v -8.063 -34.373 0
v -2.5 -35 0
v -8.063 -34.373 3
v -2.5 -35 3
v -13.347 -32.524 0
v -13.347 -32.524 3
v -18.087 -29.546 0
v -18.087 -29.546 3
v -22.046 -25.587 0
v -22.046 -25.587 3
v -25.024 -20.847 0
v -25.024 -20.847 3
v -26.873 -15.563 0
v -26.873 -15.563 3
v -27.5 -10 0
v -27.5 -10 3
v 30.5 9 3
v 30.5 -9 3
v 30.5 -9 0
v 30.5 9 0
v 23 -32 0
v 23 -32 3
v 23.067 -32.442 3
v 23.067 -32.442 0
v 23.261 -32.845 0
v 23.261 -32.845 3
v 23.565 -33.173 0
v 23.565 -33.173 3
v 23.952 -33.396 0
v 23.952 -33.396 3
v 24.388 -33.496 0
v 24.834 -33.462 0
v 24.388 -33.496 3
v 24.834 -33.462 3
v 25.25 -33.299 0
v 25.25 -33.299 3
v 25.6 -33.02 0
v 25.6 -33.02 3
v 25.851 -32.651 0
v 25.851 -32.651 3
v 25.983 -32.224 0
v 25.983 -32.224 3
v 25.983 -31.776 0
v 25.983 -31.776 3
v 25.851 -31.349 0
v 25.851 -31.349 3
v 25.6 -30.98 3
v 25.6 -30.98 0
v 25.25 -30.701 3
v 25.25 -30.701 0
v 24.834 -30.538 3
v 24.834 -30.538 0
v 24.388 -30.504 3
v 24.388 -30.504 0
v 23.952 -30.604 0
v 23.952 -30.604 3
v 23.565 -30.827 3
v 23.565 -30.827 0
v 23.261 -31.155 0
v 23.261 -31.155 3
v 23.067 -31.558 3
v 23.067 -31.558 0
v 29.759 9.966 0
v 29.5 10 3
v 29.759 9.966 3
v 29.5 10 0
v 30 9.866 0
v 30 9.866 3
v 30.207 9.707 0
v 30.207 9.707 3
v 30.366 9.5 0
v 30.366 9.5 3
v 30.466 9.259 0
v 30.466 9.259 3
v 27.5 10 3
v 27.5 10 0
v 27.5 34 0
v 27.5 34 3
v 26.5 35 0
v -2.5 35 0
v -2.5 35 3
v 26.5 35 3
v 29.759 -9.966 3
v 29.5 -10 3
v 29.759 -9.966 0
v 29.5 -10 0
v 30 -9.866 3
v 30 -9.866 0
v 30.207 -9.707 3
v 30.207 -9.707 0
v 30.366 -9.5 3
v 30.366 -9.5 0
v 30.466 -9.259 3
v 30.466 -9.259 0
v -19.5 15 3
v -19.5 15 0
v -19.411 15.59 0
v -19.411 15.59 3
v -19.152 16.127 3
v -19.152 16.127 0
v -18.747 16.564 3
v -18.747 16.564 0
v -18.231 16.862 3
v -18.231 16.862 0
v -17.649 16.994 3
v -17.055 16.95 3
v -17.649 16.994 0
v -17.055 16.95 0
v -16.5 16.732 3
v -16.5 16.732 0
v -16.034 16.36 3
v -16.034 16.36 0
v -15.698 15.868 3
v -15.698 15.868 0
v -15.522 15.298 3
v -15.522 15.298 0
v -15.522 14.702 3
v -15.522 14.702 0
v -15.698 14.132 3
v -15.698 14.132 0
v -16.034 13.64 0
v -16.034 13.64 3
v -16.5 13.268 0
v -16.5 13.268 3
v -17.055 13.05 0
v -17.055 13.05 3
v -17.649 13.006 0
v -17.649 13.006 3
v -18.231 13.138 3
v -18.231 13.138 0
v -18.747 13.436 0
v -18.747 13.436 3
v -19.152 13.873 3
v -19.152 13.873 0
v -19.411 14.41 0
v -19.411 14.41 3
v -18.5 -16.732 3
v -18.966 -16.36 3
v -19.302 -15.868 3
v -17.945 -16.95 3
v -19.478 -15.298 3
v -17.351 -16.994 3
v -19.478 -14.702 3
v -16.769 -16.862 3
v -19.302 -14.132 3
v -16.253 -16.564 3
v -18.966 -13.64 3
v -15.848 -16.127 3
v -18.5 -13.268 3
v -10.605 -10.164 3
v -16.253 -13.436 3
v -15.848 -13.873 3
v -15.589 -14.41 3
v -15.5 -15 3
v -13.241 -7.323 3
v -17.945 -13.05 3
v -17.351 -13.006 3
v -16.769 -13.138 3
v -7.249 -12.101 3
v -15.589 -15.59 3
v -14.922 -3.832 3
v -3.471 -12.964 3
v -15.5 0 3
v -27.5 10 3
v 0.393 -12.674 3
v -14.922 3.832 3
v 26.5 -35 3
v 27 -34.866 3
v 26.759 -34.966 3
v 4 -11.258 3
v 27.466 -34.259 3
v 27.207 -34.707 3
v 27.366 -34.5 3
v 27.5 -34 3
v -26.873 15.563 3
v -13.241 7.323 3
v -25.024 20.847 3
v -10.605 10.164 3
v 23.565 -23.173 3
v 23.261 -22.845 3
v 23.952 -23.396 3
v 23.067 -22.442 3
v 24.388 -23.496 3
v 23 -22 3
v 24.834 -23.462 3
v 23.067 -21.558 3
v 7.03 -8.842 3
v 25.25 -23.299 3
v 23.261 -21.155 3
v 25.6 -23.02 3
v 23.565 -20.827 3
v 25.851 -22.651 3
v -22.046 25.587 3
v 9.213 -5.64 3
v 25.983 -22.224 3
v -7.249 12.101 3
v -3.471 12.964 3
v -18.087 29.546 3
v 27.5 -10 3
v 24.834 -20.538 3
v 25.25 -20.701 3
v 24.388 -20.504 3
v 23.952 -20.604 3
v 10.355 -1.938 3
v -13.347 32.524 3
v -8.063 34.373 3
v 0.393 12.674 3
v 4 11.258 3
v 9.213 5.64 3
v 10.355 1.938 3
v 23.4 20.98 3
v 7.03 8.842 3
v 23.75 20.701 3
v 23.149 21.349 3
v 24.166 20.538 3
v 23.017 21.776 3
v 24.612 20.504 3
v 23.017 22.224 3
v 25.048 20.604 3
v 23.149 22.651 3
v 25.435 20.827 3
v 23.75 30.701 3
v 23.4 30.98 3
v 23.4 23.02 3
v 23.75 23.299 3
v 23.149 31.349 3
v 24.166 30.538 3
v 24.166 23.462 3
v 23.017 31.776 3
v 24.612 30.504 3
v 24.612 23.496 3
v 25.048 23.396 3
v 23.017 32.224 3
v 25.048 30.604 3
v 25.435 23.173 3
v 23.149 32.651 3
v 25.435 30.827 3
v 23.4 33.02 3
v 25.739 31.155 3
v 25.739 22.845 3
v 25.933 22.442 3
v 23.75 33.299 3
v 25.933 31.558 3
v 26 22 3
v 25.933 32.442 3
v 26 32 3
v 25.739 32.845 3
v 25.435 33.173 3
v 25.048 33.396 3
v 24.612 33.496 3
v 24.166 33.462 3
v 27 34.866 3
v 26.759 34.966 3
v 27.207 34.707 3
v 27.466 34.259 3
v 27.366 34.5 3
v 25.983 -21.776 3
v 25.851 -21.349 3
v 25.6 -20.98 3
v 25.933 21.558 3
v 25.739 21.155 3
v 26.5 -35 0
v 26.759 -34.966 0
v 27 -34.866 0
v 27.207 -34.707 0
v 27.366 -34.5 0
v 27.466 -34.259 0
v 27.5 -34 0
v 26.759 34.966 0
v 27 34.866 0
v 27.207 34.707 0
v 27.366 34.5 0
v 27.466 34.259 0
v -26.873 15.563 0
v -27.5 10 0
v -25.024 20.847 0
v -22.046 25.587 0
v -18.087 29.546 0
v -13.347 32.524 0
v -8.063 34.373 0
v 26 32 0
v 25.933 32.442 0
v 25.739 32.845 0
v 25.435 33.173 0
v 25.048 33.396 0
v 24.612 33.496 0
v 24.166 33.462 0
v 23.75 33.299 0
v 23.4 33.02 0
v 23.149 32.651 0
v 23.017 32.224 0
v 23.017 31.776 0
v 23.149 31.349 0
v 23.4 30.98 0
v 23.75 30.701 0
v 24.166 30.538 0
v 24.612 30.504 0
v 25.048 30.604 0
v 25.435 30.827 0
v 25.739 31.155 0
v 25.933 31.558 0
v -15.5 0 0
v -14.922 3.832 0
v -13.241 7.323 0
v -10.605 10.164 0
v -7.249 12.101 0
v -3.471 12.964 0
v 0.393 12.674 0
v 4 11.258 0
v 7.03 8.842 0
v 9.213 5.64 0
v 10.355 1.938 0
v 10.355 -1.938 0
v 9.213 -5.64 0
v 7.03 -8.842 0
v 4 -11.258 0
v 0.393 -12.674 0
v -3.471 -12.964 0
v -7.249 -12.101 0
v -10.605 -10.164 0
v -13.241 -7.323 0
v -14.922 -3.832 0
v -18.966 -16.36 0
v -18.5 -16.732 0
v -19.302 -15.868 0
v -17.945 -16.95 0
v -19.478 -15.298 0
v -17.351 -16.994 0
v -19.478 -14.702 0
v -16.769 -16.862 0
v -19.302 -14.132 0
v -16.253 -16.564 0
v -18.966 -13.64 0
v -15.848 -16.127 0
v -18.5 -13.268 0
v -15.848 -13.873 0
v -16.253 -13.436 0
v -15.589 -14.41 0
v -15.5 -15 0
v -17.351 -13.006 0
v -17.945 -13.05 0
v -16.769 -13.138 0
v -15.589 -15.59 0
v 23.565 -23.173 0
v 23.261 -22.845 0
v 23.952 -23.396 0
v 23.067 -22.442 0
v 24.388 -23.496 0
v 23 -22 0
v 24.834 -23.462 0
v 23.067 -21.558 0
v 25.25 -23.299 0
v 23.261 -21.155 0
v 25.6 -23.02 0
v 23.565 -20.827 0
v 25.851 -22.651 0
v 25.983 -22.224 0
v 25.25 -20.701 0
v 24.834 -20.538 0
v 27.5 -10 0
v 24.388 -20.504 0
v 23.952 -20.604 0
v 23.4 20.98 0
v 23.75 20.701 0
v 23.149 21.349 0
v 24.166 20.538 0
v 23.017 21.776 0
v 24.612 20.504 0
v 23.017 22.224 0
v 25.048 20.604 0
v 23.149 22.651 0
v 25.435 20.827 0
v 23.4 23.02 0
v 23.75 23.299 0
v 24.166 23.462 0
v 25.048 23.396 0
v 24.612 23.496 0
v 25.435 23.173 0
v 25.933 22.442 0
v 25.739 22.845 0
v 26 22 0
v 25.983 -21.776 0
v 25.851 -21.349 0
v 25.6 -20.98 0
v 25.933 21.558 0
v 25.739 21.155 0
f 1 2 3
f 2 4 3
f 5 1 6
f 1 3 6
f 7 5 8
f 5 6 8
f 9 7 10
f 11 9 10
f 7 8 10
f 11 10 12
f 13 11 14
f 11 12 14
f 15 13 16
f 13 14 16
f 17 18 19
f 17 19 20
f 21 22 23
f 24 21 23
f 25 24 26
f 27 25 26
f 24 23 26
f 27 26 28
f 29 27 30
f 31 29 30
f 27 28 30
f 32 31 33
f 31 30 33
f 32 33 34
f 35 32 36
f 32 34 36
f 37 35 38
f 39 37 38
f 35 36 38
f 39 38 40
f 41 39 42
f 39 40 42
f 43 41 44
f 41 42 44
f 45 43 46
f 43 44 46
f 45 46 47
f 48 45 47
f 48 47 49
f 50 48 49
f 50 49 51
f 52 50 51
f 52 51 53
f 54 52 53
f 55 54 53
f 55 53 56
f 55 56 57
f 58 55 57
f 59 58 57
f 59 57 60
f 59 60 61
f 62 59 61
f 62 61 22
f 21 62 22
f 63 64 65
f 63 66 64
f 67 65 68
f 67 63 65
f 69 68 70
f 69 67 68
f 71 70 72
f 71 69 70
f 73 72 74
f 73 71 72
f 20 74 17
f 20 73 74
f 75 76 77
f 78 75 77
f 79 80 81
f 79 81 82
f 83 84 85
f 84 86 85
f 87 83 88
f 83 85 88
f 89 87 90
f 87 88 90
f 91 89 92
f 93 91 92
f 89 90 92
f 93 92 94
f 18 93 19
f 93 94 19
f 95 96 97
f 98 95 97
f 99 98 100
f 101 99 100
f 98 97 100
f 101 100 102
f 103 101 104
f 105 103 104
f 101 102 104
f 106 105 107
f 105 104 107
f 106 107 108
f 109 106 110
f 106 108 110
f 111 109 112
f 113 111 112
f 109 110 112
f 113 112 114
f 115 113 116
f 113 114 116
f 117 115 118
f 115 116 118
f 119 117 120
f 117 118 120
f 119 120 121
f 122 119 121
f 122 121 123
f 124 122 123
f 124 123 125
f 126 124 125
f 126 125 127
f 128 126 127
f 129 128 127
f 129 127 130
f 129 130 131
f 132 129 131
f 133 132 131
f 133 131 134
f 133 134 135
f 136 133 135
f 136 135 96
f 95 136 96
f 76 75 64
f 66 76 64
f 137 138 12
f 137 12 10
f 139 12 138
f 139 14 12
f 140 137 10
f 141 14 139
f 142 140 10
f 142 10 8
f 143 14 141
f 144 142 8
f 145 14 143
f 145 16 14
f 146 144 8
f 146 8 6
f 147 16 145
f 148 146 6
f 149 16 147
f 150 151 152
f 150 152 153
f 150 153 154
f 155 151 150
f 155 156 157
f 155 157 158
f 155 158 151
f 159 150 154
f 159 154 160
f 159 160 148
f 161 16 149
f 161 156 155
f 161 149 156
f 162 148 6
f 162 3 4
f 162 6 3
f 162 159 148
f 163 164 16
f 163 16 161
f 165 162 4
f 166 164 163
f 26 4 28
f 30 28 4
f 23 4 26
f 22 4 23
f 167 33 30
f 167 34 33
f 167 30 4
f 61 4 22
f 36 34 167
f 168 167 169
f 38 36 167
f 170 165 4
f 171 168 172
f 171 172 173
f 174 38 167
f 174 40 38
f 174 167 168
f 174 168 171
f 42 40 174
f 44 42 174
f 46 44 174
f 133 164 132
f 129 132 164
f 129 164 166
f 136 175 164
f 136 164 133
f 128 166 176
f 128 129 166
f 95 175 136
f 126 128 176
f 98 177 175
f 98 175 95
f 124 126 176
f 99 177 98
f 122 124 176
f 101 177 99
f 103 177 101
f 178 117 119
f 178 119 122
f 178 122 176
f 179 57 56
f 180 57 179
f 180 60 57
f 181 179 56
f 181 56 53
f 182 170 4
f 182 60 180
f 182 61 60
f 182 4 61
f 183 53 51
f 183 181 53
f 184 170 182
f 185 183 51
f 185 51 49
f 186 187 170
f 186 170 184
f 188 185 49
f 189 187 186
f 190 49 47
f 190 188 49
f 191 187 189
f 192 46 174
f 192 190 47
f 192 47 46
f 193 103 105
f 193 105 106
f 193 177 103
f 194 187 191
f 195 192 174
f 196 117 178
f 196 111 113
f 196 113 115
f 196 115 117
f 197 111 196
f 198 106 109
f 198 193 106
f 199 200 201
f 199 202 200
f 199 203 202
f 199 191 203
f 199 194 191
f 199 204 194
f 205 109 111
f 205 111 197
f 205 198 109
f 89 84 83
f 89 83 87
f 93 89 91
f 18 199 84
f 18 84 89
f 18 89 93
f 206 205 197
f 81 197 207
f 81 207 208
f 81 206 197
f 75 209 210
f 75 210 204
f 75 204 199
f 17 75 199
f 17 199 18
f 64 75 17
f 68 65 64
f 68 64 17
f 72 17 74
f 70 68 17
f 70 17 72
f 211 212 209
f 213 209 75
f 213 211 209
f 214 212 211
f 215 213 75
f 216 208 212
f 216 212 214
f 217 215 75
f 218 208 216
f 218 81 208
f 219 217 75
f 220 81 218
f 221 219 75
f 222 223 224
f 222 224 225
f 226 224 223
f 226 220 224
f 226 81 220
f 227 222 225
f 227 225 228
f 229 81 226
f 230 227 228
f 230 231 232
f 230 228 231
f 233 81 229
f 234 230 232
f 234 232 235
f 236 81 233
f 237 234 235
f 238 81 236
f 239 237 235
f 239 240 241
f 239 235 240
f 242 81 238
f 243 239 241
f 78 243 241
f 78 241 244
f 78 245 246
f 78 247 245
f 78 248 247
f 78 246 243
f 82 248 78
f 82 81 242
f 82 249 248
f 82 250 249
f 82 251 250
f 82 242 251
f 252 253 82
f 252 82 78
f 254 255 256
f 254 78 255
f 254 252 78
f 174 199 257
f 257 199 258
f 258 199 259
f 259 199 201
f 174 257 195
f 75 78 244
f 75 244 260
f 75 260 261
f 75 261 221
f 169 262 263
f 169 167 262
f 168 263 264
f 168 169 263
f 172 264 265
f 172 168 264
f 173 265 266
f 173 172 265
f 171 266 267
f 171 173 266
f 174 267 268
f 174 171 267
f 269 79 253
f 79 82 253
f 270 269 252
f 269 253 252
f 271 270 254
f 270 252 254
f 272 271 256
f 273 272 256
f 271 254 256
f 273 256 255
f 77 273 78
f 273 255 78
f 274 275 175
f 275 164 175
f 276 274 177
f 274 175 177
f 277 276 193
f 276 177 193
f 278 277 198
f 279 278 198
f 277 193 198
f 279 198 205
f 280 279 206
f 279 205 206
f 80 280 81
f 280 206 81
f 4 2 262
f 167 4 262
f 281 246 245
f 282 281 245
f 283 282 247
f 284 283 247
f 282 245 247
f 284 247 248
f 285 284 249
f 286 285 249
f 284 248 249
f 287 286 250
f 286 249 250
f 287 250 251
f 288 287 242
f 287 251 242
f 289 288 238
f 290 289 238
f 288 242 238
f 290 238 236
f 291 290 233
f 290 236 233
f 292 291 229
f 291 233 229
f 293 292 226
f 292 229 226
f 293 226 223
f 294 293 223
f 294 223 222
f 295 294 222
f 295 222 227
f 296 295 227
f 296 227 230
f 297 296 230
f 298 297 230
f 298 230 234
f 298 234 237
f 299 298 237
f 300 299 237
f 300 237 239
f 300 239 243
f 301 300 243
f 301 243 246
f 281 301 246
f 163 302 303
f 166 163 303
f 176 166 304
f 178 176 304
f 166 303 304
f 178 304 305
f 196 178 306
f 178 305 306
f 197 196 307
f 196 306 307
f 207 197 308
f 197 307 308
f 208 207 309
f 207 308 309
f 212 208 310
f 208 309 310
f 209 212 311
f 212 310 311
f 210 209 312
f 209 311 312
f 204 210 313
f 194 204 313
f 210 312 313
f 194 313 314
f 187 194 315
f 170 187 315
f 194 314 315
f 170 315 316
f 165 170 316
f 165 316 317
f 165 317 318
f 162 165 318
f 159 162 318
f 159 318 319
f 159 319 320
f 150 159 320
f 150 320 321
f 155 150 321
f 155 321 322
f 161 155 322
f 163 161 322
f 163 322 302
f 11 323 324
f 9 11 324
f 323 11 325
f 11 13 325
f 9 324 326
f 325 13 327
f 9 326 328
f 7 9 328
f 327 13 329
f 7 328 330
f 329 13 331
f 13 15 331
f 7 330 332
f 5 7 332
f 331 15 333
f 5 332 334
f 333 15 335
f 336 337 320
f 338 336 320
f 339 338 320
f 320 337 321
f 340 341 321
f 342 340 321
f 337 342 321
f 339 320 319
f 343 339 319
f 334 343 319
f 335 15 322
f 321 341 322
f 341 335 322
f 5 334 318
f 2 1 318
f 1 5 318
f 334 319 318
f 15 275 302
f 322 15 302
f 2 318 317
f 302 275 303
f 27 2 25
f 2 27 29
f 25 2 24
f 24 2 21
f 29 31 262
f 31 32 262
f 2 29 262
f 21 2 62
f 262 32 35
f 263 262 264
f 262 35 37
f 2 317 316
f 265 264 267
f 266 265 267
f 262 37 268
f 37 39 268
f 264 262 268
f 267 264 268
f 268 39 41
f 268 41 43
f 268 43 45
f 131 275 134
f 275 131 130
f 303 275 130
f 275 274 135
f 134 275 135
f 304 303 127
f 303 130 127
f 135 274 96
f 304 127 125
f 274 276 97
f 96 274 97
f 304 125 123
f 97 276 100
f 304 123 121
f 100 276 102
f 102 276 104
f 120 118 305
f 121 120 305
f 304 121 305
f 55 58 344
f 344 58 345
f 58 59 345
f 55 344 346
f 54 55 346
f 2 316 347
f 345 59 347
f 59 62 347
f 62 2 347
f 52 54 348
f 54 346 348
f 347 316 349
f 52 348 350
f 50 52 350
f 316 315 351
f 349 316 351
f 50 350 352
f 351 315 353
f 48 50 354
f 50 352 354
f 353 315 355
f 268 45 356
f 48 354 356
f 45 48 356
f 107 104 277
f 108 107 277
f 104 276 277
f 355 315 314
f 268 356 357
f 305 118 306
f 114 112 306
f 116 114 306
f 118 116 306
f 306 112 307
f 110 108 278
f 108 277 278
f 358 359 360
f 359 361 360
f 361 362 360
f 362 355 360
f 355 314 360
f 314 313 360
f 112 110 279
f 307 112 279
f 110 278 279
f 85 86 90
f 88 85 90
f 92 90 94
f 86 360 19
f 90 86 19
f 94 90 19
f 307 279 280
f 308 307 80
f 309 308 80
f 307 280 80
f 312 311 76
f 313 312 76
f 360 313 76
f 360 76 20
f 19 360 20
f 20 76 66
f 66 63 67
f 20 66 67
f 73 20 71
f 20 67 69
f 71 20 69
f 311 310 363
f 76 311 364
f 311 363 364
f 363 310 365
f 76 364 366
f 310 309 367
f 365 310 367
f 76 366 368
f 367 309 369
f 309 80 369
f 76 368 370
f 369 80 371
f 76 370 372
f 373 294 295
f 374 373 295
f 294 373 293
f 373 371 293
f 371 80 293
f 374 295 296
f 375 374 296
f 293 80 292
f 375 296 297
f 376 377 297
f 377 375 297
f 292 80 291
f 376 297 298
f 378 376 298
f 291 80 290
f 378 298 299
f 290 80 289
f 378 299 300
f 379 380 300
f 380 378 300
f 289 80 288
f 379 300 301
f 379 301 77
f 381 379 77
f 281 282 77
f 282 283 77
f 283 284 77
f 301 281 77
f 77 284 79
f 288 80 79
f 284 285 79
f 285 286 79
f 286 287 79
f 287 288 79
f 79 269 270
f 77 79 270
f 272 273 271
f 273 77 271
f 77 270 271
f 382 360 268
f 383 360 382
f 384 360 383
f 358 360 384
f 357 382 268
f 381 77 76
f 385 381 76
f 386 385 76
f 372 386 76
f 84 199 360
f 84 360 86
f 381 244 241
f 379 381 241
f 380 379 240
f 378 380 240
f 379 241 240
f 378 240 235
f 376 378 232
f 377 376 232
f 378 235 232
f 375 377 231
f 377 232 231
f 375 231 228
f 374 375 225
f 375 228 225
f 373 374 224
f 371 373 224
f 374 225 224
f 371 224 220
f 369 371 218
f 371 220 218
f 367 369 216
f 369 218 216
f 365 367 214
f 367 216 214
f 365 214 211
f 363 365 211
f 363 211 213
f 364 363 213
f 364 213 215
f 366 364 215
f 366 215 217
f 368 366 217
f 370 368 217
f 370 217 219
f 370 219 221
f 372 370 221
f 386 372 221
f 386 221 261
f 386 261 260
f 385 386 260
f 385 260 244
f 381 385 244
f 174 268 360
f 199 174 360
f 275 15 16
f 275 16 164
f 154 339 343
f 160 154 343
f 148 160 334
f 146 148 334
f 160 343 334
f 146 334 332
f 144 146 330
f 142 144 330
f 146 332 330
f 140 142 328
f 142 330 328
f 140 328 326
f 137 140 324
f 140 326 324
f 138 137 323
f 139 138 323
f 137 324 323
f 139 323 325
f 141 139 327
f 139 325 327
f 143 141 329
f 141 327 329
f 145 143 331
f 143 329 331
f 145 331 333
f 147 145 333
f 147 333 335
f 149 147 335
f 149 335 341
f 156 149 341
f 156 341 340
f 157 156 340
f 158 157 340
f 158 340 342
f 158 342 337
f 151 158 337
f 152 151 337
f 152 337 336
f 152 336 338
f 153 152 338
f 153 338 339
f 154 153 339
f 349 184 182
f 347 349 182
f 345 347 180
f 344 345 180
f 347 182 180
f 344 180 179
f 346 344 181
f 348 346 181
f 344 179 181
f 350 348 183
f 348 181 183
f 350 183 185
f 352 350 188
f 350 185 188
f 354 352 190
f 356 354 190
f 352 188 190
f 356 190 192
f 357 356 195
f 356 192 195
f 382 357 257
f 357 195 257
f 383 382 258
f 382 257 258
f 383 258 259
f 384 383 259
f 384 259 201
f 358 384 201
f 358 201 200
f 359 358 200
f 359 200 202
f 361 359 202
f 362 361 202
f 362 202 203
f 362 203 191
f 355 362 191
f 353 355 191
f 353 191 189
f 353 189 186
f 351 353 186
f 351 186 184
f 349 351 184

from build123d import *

# Parameters (mm, degrees)
SKETCH_1_W          = 55
SKETCH_1_H          = 70
EXTRUDE_1_DEPTH     = 3
SKETCH_3_R          = 13
CUT_EXTRUDE_1_DEPTH = 45.612218057
SKETCH_4_R          = 1.5
CUT_EXTRUDE_2_DEPTH = 45.612218057
SKETCH_5_W          = 3
SKETCH_5_H          = 20
EXTRUDE_2_DEPTH     = 3
FILLET_1_R          = 1
FILLET_2_R          = 25
SKETCH_6_R          = 2
CUT_EXTRUDE_3_DEPTH = 47.521500406


with BuildPart() as part:
    # 草图1 → 凸台-拉伸1 (new body)
    with BuildSketch(Plane.XY):
        Rectangle(SKETCH_1_W, SKETCH_1_H)
    extrude(amount=EXTRUDE_1_DEPTH)

    # 草图3 → 切除-拉伸1 (cut, through all)
    with BuildSketch(Plane(origin=(0, 0, 0), x_dir=(-1, 0, 0), z_dir=(0, 0, -1))):
        with Locations((2.5, 0)):
            Circle(SKETCH_3_R)
    extrude(amount=-CUT_EXTRUDE_1_DEPTH, mode=Mode.SUBTRACT)

    # 草图4 → 切除-拉伸2 (cut, through all)
    with BuildSketch(Plane.XY.offset(3)):
        with Locations((24.5, 32)):
            Circle(SKETCH_4_R)
        with Locations((24.5, 22)):
            Circle(SKETCH_4_R)
        with Locations(Location((24.5, -22, 0), (0, 0, 180))):
            Circle(SKETCH_4_R)
        with Locations(Location((24.5, -32, 0), (0, 0, 180))):
            Circle(SKETCH_4_R)
    extrude(amount=-CUT_EXTRUDE_2_DEPTH, mode=Mode.SUBTRACT)

    # 草图5 → 凸台-拉伸2 (add)
    with BuildSketch(Plane.XY.offset(3)):
        with Locations((29, 0)):
            Rectangle(SKETCH_5_W, SKETCH_5_H)
    extrude(amount=-EXTRUDE_2_DEPTH)

    # 圆角1
    fillet_1_edges = [part.edges().sort_by_distance(p)[0] for p in [
        (30.5, 10, 1.5),
        (30.5, -10, 1.5),
        (27.5, -35, 1.5),
        (27.5, 35, 1.5),
    ]]
    fillet(fillet_1_edges, radius=FILLET_1_R)

    # 圆角2
    fillet_2_edges = [part.edges().sort_by_distance(p)[0] for p in [
        (-27.5, -35, 1.5),
        (-27.5, 35, 1.5),
    ]]
    fillet(fillet_2_edges, radius=FILLET_2_R)

    # 草图6 → 切除-拉伸3 (cut, through all)
    with BuildSketch(Plane(origin=(0, 0, 0), x_dir=(-1, 0, 0), z_dir=(0, 0, -1))):
        with Locations((17.5, 15)):
            Circle(SKETCH_6_R)
        with Locations(Location((17.5, -15, 0), (0, 0, 180))):
            Circle(SKETCH_6_R)
    extrude(amount=-CUT_EXTRUDE_3_DEPTH, mode=Mode.SUBTRACT)


solid = part.part
